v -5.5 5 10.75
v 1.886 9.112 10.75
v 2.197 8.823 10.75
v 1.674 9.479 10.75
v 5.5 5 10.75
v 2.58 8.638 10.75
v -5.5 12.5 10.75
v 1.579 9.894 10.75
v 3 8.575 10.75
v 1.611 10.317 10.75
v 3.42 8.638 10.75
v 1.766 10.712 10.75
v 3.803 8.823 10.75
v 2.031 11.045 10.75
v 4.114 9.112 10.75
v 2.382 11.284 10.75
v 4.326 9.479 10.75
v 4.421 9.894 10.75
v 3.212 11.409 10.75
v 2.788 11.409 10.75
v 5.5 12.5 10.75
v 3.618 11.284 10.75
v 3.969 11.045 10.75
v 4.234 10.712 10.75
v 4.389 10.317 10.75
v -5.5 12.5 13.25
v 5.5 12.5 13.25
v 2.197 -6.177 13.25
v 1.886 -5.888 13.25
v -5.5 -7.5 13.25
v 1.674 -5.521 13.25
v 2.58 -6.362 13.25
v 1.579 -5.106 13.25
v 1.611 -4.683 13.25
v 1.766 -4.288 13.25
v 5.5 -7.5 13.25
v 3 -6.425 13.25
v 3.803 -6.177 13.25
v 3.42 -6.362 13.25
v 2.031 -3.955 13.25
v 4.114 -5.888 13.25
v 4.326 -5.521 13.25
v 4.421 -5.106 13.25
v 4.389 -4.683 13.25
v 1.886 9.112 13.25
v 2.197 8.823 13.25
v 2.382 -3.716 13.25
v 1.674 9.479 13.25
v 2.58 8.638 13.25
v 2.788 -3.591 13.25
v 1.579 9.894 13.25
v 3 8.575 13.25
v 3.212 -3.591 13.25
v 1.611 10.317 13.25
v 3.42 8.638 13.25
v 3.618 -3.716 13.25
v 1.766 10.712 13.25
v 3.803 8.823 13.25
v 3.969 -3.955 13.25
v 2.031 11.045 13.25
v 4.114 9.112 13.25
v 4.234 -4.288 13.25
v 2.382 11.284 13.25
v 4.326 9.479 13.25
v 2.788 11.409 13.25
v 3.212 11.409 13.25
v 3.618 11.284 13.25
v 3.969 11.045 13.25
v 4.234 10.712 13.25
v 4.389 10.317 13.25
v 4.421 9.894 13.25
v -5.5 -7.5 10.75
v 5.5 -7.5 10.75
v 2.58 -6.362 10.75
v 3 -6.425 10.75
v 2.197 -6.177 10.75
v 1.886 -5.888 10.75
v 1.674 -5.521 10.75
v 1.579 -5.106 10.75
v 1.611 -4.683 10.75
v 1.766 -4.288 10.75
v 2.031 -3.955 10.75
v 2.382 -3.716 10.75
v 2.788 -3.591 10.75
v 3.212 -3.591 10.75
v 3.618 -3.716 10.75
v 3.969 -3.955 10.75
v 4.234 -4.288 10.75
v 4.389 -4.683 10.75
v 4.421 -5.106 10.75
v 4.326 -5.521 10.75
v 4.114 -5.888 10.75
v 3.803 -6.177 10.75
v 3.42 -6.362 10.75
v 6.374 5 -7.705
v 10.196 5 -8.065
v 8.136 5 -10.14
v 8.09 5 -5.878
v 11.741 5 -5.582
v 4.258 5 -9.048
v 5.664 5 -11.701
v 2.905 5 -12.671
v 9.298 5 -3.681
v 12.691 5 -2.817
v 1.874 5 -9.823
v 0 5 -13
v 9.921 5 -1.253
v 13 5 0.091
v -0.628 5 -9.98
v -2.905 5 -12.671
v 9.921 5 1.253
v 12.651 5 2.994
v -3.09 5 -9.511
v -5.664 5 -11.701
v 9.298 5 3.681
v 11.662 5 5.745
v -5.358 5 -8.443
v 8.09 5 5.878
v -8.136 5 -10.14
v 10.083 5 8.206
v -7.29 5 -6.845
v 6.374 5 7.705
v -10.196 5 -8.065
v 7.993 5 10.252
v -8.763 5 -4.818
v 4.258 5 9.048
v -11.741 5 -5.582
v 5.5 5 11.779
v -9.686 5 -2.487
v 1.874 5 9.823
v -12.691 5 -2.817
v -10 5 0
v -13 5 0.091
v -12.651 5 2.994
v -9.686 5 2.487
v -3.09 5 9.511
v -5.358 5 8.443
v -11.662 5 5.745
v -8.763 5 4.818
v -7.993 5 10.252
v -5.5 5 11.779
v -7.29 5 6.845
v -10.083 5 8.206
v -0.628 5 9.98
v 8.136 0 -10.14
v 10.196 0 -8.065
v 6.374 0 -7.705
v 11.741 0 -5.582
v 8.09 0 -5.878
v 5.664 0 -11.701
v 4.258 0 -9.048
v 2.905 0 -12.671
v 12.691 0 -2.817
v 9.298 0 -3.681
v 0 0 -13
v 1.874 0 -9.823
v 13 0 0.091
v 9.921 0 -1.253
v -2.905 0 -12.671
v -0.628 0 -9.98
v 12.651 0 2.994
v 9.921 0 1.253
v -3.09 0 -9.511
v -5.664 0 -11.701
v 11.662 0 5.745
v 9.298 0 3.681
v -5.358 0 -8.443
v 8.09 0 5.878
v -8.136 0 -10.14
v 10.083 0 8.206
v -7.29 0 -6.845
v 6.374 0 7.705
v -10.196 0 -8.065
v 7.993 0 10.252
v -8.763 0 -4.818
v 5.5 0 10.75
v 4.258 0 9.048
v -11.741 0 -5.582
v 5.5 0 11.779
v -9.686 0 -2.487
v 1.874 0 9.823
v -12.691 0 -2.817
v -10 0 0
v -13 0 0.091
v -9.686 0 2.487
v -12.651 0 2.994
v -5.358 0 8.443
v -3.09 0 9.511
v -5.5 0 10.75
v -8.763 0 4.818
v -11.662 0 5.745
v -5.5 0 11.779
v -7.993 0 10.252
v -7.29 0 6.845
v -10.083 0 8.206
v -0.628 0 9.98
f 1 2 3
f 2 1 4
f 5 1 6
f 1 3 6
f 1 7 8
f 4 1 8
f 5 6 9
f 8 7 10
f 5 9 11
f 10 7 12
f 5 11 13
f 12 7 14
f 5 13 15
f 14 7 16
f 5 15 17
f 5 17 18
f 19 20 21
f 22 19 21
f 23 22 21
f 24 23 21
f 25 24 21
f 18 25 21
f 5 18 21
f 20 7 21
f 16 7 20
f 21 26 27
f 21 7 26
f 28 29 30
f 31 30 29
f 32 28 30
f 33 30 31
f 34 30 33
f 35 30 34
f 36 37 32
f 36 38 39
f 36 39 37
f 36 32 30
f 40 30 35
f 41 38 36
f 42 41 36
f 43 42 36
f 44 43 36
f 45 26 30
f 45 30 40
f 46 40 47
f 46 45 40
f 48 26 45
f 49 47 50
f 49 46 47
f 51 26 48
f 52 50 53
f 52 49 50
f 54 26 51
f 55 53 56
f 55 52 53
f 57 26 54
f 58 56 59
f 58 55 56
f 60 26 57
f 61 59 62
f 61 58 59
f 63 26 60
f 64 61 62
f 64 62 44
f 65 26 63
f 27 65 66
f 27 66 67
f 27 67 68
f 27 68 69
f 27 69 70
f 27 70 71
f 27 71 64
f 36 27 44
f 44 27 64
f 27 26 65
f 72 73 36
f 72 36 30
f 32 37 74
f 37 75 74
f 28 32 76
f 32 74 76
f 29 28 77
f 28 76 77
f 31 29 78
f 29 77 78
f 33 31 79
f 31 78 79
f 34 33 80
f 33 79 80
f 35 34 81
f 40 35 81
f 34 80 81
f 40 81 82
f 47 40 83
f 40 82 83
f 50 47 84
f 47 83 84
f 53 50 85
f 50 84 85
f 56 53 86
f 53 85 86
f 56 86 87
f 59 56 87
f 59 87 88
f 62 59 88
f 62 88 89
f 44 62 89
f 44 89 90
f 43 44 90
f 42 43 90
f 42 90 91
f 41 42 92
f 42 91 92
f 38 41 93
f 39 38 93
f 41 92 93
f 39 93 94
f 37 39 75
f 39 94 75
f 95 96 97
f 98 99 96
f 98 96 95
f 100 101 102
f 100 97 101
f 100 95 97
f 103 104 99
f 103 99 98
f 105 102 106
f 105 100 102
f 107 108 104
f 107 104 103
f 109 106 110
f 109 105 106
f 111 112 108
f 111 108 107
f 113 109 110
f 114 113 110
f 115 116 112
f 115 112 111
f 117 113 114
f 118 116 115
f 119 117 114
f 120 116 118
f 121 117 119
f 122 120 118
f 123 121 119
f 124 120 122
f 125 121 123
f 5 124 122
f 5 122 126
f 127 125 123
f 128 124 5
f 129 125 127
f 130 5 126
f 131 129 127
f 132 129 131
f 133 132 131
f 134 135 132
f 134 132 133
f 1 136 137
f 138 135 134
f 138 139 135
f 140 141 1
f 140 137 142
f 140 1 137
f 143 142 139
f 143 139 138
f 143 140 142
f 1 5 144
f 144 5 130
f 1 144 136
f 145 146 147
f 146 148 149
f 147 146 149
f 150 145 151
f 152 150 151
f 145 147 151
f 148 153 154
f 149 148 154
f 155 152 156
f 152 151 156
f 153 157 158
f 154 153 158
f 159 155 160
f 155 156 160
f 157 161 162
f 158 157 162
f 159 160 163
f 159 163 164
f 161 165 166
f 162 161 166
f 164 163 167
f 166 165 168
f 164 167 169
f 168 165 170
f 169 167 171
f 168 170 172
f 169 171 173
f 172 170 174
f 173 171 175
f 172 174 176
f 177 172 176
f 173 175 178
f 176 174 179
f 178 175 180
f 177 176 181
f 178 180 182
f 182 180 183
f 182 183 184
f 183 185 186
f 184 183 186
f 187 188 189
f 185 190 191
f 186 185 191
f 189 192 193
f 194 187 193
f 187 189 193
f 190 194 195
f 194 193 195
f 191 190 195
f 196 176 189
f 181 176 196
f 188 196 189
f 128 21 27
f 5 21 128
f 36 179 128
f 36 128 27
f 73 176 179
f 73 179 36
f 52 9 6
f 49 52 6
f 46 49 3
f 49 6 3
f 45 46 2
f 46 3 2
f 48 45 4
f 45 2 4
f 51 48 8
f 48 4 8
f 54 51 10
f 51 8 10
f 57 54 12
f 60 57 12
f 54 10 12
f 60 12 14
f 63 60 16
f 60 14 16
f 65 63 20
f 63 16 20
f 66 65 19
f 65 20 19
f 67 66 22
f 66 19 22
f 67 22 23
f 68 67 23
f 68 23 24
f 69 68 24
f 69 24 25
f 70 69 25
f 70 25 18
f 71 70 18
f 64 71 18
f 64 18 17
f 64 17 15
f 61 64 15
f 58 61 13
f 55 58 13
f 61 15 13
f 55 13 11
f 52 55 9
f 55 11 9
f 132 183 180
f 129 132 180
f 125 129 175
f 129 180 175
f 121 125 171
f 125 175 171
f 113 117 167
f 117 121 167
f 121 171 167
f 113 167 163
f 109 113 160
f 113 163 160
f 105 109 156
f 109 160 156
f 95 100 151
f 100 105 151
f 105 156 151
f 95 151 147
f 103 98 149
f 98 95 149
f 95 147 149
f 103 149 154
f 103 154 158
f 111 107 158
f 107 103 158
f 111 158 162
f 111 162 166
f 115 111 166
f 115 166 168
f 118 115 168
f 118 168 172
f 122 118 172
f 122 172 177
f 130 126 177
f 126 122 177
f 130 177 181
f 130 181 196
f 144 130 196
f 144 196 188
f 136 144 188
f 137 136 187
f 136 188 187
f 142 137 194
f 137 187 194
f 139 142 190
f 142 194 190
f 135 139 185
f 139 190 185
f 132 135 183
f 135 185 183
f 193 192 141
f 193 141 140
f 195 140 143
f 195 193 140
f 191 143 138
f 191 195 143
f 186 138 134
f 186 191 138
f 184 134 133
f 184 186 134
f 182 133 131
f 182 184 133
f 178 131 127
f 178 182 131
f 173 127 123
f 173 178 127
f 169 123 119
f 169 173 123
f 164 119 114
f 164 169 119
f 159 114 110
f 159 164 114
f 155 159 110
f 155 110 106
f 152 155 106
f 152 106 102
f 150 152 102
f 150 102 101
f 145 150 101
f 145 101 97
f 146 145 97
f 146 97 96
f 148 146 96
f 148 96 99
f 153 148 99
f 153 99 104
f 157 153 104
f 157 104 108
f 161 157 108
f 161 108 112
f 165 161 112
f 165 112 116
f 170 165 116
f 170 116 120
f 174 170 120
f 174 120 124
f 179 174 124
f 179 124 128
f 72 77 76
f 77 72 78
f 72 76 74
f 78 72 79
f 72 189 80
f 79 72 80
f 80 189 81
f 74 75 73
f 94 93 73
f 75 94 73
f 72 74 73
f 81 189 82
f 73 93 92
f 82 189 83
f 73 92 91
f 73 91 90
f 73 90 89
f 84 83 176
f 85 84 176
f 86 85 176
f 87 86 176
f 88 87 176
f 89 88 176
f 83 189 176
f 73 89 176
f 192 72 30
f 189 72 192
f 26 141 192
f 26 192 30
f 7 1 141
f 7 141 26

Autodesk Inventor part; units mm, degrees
ref_plane "YZ Plane" through (0, 0, 0) normal (1, 0, 0) x (0, 1, 0)
ref_plane "XZ Plane" through (0, 0, 0) normal (0, 1, 0) x (-1, 0, 0)
sketch "Sketch2" plane through (0, 0, 0) normal (0, 1, 0) x (-1, 0, 0)
  circle A0 centre (0, 0) radius 10
  circle A1 centre (0, 0) radius 13
  dimension "d7" = 20
  dimension "d8" = 26
extrude "Extrusion1" add sketch "Sketch2" along normal blind 5
sketch "Sketch3" plane through (0, 0, 0) normal (0, 0, 1) x (1, 0, 0)
  point P0 (0, 0)
ref_plane "Work Plane1" through (0, 0, 12) normal (0, 0, 1) x (1, 0, 0)
sketch "Sketch4" plane through (0, 0, 12) normal (0, 0, 1) x (1, 0, 0)
  point P0 (0, 0)
sketch "Sketch5" plane through (0, 0, 12) normal (0, 0, 1) x (1, 0, 0)
  line L0 (-13, 0) -> (13, 0) projected
  line L1 (5.5, 0) -> (-5.5, 0)
  line L2 (-5.5, 0) -> (-5.5, 12.5)
  line L3 (-5.5, 12.5) -> (5.5, 12.5)
  line L4 (5.5, 12.5) -> (5.5, 0)
  line L5 (-5.5, 0) -> (5.5, 0)
  line L6 (5.5, 0) -> (5.5, -7.5)
  line L7 (5.5, -7.5) -> (-5.5, -7.5)
  line L8 (-5.5, -7.5) -> (-5.5, 0)
  line L9 (0, -16.9) -> (0, 20.9) projected
  dimension "d16" = 11
  dimension "d17" = 7.5
  dimension "d18" = 12.5
  dimension "d19" = 5.5
extrude "Extrusion2" add sketch "Sketch5" along normal mid plane 2.5
sketch "Sketch6" plane through (0, 0, 13.25) normal (0, 0, 1) x (1, 0, 0)
  line L0 (5.5, -7.5) -> (5.5, 12.5) projected
  line L1 (5.5, 12.5) -> (-5.5, 12.5) projected
  line L2 (-5.5, -7.5) -> (5.5, -7.5) projected
  point P0 (0, 0)
  point P1 (3, 10)
  point P2 (3, -5)
  dimension "d20" = 2.5
  dimension "d21" = 2.5
  dimension "d22" = 2.5
  dimension "d30" = 2.5
hole "Hole1" at (3, -5, 13.25) at (3, 10, 13.25) direction (0, 0, -1) diameter 2.85 depth 8 tip angle 118
properties part number "Ring"
